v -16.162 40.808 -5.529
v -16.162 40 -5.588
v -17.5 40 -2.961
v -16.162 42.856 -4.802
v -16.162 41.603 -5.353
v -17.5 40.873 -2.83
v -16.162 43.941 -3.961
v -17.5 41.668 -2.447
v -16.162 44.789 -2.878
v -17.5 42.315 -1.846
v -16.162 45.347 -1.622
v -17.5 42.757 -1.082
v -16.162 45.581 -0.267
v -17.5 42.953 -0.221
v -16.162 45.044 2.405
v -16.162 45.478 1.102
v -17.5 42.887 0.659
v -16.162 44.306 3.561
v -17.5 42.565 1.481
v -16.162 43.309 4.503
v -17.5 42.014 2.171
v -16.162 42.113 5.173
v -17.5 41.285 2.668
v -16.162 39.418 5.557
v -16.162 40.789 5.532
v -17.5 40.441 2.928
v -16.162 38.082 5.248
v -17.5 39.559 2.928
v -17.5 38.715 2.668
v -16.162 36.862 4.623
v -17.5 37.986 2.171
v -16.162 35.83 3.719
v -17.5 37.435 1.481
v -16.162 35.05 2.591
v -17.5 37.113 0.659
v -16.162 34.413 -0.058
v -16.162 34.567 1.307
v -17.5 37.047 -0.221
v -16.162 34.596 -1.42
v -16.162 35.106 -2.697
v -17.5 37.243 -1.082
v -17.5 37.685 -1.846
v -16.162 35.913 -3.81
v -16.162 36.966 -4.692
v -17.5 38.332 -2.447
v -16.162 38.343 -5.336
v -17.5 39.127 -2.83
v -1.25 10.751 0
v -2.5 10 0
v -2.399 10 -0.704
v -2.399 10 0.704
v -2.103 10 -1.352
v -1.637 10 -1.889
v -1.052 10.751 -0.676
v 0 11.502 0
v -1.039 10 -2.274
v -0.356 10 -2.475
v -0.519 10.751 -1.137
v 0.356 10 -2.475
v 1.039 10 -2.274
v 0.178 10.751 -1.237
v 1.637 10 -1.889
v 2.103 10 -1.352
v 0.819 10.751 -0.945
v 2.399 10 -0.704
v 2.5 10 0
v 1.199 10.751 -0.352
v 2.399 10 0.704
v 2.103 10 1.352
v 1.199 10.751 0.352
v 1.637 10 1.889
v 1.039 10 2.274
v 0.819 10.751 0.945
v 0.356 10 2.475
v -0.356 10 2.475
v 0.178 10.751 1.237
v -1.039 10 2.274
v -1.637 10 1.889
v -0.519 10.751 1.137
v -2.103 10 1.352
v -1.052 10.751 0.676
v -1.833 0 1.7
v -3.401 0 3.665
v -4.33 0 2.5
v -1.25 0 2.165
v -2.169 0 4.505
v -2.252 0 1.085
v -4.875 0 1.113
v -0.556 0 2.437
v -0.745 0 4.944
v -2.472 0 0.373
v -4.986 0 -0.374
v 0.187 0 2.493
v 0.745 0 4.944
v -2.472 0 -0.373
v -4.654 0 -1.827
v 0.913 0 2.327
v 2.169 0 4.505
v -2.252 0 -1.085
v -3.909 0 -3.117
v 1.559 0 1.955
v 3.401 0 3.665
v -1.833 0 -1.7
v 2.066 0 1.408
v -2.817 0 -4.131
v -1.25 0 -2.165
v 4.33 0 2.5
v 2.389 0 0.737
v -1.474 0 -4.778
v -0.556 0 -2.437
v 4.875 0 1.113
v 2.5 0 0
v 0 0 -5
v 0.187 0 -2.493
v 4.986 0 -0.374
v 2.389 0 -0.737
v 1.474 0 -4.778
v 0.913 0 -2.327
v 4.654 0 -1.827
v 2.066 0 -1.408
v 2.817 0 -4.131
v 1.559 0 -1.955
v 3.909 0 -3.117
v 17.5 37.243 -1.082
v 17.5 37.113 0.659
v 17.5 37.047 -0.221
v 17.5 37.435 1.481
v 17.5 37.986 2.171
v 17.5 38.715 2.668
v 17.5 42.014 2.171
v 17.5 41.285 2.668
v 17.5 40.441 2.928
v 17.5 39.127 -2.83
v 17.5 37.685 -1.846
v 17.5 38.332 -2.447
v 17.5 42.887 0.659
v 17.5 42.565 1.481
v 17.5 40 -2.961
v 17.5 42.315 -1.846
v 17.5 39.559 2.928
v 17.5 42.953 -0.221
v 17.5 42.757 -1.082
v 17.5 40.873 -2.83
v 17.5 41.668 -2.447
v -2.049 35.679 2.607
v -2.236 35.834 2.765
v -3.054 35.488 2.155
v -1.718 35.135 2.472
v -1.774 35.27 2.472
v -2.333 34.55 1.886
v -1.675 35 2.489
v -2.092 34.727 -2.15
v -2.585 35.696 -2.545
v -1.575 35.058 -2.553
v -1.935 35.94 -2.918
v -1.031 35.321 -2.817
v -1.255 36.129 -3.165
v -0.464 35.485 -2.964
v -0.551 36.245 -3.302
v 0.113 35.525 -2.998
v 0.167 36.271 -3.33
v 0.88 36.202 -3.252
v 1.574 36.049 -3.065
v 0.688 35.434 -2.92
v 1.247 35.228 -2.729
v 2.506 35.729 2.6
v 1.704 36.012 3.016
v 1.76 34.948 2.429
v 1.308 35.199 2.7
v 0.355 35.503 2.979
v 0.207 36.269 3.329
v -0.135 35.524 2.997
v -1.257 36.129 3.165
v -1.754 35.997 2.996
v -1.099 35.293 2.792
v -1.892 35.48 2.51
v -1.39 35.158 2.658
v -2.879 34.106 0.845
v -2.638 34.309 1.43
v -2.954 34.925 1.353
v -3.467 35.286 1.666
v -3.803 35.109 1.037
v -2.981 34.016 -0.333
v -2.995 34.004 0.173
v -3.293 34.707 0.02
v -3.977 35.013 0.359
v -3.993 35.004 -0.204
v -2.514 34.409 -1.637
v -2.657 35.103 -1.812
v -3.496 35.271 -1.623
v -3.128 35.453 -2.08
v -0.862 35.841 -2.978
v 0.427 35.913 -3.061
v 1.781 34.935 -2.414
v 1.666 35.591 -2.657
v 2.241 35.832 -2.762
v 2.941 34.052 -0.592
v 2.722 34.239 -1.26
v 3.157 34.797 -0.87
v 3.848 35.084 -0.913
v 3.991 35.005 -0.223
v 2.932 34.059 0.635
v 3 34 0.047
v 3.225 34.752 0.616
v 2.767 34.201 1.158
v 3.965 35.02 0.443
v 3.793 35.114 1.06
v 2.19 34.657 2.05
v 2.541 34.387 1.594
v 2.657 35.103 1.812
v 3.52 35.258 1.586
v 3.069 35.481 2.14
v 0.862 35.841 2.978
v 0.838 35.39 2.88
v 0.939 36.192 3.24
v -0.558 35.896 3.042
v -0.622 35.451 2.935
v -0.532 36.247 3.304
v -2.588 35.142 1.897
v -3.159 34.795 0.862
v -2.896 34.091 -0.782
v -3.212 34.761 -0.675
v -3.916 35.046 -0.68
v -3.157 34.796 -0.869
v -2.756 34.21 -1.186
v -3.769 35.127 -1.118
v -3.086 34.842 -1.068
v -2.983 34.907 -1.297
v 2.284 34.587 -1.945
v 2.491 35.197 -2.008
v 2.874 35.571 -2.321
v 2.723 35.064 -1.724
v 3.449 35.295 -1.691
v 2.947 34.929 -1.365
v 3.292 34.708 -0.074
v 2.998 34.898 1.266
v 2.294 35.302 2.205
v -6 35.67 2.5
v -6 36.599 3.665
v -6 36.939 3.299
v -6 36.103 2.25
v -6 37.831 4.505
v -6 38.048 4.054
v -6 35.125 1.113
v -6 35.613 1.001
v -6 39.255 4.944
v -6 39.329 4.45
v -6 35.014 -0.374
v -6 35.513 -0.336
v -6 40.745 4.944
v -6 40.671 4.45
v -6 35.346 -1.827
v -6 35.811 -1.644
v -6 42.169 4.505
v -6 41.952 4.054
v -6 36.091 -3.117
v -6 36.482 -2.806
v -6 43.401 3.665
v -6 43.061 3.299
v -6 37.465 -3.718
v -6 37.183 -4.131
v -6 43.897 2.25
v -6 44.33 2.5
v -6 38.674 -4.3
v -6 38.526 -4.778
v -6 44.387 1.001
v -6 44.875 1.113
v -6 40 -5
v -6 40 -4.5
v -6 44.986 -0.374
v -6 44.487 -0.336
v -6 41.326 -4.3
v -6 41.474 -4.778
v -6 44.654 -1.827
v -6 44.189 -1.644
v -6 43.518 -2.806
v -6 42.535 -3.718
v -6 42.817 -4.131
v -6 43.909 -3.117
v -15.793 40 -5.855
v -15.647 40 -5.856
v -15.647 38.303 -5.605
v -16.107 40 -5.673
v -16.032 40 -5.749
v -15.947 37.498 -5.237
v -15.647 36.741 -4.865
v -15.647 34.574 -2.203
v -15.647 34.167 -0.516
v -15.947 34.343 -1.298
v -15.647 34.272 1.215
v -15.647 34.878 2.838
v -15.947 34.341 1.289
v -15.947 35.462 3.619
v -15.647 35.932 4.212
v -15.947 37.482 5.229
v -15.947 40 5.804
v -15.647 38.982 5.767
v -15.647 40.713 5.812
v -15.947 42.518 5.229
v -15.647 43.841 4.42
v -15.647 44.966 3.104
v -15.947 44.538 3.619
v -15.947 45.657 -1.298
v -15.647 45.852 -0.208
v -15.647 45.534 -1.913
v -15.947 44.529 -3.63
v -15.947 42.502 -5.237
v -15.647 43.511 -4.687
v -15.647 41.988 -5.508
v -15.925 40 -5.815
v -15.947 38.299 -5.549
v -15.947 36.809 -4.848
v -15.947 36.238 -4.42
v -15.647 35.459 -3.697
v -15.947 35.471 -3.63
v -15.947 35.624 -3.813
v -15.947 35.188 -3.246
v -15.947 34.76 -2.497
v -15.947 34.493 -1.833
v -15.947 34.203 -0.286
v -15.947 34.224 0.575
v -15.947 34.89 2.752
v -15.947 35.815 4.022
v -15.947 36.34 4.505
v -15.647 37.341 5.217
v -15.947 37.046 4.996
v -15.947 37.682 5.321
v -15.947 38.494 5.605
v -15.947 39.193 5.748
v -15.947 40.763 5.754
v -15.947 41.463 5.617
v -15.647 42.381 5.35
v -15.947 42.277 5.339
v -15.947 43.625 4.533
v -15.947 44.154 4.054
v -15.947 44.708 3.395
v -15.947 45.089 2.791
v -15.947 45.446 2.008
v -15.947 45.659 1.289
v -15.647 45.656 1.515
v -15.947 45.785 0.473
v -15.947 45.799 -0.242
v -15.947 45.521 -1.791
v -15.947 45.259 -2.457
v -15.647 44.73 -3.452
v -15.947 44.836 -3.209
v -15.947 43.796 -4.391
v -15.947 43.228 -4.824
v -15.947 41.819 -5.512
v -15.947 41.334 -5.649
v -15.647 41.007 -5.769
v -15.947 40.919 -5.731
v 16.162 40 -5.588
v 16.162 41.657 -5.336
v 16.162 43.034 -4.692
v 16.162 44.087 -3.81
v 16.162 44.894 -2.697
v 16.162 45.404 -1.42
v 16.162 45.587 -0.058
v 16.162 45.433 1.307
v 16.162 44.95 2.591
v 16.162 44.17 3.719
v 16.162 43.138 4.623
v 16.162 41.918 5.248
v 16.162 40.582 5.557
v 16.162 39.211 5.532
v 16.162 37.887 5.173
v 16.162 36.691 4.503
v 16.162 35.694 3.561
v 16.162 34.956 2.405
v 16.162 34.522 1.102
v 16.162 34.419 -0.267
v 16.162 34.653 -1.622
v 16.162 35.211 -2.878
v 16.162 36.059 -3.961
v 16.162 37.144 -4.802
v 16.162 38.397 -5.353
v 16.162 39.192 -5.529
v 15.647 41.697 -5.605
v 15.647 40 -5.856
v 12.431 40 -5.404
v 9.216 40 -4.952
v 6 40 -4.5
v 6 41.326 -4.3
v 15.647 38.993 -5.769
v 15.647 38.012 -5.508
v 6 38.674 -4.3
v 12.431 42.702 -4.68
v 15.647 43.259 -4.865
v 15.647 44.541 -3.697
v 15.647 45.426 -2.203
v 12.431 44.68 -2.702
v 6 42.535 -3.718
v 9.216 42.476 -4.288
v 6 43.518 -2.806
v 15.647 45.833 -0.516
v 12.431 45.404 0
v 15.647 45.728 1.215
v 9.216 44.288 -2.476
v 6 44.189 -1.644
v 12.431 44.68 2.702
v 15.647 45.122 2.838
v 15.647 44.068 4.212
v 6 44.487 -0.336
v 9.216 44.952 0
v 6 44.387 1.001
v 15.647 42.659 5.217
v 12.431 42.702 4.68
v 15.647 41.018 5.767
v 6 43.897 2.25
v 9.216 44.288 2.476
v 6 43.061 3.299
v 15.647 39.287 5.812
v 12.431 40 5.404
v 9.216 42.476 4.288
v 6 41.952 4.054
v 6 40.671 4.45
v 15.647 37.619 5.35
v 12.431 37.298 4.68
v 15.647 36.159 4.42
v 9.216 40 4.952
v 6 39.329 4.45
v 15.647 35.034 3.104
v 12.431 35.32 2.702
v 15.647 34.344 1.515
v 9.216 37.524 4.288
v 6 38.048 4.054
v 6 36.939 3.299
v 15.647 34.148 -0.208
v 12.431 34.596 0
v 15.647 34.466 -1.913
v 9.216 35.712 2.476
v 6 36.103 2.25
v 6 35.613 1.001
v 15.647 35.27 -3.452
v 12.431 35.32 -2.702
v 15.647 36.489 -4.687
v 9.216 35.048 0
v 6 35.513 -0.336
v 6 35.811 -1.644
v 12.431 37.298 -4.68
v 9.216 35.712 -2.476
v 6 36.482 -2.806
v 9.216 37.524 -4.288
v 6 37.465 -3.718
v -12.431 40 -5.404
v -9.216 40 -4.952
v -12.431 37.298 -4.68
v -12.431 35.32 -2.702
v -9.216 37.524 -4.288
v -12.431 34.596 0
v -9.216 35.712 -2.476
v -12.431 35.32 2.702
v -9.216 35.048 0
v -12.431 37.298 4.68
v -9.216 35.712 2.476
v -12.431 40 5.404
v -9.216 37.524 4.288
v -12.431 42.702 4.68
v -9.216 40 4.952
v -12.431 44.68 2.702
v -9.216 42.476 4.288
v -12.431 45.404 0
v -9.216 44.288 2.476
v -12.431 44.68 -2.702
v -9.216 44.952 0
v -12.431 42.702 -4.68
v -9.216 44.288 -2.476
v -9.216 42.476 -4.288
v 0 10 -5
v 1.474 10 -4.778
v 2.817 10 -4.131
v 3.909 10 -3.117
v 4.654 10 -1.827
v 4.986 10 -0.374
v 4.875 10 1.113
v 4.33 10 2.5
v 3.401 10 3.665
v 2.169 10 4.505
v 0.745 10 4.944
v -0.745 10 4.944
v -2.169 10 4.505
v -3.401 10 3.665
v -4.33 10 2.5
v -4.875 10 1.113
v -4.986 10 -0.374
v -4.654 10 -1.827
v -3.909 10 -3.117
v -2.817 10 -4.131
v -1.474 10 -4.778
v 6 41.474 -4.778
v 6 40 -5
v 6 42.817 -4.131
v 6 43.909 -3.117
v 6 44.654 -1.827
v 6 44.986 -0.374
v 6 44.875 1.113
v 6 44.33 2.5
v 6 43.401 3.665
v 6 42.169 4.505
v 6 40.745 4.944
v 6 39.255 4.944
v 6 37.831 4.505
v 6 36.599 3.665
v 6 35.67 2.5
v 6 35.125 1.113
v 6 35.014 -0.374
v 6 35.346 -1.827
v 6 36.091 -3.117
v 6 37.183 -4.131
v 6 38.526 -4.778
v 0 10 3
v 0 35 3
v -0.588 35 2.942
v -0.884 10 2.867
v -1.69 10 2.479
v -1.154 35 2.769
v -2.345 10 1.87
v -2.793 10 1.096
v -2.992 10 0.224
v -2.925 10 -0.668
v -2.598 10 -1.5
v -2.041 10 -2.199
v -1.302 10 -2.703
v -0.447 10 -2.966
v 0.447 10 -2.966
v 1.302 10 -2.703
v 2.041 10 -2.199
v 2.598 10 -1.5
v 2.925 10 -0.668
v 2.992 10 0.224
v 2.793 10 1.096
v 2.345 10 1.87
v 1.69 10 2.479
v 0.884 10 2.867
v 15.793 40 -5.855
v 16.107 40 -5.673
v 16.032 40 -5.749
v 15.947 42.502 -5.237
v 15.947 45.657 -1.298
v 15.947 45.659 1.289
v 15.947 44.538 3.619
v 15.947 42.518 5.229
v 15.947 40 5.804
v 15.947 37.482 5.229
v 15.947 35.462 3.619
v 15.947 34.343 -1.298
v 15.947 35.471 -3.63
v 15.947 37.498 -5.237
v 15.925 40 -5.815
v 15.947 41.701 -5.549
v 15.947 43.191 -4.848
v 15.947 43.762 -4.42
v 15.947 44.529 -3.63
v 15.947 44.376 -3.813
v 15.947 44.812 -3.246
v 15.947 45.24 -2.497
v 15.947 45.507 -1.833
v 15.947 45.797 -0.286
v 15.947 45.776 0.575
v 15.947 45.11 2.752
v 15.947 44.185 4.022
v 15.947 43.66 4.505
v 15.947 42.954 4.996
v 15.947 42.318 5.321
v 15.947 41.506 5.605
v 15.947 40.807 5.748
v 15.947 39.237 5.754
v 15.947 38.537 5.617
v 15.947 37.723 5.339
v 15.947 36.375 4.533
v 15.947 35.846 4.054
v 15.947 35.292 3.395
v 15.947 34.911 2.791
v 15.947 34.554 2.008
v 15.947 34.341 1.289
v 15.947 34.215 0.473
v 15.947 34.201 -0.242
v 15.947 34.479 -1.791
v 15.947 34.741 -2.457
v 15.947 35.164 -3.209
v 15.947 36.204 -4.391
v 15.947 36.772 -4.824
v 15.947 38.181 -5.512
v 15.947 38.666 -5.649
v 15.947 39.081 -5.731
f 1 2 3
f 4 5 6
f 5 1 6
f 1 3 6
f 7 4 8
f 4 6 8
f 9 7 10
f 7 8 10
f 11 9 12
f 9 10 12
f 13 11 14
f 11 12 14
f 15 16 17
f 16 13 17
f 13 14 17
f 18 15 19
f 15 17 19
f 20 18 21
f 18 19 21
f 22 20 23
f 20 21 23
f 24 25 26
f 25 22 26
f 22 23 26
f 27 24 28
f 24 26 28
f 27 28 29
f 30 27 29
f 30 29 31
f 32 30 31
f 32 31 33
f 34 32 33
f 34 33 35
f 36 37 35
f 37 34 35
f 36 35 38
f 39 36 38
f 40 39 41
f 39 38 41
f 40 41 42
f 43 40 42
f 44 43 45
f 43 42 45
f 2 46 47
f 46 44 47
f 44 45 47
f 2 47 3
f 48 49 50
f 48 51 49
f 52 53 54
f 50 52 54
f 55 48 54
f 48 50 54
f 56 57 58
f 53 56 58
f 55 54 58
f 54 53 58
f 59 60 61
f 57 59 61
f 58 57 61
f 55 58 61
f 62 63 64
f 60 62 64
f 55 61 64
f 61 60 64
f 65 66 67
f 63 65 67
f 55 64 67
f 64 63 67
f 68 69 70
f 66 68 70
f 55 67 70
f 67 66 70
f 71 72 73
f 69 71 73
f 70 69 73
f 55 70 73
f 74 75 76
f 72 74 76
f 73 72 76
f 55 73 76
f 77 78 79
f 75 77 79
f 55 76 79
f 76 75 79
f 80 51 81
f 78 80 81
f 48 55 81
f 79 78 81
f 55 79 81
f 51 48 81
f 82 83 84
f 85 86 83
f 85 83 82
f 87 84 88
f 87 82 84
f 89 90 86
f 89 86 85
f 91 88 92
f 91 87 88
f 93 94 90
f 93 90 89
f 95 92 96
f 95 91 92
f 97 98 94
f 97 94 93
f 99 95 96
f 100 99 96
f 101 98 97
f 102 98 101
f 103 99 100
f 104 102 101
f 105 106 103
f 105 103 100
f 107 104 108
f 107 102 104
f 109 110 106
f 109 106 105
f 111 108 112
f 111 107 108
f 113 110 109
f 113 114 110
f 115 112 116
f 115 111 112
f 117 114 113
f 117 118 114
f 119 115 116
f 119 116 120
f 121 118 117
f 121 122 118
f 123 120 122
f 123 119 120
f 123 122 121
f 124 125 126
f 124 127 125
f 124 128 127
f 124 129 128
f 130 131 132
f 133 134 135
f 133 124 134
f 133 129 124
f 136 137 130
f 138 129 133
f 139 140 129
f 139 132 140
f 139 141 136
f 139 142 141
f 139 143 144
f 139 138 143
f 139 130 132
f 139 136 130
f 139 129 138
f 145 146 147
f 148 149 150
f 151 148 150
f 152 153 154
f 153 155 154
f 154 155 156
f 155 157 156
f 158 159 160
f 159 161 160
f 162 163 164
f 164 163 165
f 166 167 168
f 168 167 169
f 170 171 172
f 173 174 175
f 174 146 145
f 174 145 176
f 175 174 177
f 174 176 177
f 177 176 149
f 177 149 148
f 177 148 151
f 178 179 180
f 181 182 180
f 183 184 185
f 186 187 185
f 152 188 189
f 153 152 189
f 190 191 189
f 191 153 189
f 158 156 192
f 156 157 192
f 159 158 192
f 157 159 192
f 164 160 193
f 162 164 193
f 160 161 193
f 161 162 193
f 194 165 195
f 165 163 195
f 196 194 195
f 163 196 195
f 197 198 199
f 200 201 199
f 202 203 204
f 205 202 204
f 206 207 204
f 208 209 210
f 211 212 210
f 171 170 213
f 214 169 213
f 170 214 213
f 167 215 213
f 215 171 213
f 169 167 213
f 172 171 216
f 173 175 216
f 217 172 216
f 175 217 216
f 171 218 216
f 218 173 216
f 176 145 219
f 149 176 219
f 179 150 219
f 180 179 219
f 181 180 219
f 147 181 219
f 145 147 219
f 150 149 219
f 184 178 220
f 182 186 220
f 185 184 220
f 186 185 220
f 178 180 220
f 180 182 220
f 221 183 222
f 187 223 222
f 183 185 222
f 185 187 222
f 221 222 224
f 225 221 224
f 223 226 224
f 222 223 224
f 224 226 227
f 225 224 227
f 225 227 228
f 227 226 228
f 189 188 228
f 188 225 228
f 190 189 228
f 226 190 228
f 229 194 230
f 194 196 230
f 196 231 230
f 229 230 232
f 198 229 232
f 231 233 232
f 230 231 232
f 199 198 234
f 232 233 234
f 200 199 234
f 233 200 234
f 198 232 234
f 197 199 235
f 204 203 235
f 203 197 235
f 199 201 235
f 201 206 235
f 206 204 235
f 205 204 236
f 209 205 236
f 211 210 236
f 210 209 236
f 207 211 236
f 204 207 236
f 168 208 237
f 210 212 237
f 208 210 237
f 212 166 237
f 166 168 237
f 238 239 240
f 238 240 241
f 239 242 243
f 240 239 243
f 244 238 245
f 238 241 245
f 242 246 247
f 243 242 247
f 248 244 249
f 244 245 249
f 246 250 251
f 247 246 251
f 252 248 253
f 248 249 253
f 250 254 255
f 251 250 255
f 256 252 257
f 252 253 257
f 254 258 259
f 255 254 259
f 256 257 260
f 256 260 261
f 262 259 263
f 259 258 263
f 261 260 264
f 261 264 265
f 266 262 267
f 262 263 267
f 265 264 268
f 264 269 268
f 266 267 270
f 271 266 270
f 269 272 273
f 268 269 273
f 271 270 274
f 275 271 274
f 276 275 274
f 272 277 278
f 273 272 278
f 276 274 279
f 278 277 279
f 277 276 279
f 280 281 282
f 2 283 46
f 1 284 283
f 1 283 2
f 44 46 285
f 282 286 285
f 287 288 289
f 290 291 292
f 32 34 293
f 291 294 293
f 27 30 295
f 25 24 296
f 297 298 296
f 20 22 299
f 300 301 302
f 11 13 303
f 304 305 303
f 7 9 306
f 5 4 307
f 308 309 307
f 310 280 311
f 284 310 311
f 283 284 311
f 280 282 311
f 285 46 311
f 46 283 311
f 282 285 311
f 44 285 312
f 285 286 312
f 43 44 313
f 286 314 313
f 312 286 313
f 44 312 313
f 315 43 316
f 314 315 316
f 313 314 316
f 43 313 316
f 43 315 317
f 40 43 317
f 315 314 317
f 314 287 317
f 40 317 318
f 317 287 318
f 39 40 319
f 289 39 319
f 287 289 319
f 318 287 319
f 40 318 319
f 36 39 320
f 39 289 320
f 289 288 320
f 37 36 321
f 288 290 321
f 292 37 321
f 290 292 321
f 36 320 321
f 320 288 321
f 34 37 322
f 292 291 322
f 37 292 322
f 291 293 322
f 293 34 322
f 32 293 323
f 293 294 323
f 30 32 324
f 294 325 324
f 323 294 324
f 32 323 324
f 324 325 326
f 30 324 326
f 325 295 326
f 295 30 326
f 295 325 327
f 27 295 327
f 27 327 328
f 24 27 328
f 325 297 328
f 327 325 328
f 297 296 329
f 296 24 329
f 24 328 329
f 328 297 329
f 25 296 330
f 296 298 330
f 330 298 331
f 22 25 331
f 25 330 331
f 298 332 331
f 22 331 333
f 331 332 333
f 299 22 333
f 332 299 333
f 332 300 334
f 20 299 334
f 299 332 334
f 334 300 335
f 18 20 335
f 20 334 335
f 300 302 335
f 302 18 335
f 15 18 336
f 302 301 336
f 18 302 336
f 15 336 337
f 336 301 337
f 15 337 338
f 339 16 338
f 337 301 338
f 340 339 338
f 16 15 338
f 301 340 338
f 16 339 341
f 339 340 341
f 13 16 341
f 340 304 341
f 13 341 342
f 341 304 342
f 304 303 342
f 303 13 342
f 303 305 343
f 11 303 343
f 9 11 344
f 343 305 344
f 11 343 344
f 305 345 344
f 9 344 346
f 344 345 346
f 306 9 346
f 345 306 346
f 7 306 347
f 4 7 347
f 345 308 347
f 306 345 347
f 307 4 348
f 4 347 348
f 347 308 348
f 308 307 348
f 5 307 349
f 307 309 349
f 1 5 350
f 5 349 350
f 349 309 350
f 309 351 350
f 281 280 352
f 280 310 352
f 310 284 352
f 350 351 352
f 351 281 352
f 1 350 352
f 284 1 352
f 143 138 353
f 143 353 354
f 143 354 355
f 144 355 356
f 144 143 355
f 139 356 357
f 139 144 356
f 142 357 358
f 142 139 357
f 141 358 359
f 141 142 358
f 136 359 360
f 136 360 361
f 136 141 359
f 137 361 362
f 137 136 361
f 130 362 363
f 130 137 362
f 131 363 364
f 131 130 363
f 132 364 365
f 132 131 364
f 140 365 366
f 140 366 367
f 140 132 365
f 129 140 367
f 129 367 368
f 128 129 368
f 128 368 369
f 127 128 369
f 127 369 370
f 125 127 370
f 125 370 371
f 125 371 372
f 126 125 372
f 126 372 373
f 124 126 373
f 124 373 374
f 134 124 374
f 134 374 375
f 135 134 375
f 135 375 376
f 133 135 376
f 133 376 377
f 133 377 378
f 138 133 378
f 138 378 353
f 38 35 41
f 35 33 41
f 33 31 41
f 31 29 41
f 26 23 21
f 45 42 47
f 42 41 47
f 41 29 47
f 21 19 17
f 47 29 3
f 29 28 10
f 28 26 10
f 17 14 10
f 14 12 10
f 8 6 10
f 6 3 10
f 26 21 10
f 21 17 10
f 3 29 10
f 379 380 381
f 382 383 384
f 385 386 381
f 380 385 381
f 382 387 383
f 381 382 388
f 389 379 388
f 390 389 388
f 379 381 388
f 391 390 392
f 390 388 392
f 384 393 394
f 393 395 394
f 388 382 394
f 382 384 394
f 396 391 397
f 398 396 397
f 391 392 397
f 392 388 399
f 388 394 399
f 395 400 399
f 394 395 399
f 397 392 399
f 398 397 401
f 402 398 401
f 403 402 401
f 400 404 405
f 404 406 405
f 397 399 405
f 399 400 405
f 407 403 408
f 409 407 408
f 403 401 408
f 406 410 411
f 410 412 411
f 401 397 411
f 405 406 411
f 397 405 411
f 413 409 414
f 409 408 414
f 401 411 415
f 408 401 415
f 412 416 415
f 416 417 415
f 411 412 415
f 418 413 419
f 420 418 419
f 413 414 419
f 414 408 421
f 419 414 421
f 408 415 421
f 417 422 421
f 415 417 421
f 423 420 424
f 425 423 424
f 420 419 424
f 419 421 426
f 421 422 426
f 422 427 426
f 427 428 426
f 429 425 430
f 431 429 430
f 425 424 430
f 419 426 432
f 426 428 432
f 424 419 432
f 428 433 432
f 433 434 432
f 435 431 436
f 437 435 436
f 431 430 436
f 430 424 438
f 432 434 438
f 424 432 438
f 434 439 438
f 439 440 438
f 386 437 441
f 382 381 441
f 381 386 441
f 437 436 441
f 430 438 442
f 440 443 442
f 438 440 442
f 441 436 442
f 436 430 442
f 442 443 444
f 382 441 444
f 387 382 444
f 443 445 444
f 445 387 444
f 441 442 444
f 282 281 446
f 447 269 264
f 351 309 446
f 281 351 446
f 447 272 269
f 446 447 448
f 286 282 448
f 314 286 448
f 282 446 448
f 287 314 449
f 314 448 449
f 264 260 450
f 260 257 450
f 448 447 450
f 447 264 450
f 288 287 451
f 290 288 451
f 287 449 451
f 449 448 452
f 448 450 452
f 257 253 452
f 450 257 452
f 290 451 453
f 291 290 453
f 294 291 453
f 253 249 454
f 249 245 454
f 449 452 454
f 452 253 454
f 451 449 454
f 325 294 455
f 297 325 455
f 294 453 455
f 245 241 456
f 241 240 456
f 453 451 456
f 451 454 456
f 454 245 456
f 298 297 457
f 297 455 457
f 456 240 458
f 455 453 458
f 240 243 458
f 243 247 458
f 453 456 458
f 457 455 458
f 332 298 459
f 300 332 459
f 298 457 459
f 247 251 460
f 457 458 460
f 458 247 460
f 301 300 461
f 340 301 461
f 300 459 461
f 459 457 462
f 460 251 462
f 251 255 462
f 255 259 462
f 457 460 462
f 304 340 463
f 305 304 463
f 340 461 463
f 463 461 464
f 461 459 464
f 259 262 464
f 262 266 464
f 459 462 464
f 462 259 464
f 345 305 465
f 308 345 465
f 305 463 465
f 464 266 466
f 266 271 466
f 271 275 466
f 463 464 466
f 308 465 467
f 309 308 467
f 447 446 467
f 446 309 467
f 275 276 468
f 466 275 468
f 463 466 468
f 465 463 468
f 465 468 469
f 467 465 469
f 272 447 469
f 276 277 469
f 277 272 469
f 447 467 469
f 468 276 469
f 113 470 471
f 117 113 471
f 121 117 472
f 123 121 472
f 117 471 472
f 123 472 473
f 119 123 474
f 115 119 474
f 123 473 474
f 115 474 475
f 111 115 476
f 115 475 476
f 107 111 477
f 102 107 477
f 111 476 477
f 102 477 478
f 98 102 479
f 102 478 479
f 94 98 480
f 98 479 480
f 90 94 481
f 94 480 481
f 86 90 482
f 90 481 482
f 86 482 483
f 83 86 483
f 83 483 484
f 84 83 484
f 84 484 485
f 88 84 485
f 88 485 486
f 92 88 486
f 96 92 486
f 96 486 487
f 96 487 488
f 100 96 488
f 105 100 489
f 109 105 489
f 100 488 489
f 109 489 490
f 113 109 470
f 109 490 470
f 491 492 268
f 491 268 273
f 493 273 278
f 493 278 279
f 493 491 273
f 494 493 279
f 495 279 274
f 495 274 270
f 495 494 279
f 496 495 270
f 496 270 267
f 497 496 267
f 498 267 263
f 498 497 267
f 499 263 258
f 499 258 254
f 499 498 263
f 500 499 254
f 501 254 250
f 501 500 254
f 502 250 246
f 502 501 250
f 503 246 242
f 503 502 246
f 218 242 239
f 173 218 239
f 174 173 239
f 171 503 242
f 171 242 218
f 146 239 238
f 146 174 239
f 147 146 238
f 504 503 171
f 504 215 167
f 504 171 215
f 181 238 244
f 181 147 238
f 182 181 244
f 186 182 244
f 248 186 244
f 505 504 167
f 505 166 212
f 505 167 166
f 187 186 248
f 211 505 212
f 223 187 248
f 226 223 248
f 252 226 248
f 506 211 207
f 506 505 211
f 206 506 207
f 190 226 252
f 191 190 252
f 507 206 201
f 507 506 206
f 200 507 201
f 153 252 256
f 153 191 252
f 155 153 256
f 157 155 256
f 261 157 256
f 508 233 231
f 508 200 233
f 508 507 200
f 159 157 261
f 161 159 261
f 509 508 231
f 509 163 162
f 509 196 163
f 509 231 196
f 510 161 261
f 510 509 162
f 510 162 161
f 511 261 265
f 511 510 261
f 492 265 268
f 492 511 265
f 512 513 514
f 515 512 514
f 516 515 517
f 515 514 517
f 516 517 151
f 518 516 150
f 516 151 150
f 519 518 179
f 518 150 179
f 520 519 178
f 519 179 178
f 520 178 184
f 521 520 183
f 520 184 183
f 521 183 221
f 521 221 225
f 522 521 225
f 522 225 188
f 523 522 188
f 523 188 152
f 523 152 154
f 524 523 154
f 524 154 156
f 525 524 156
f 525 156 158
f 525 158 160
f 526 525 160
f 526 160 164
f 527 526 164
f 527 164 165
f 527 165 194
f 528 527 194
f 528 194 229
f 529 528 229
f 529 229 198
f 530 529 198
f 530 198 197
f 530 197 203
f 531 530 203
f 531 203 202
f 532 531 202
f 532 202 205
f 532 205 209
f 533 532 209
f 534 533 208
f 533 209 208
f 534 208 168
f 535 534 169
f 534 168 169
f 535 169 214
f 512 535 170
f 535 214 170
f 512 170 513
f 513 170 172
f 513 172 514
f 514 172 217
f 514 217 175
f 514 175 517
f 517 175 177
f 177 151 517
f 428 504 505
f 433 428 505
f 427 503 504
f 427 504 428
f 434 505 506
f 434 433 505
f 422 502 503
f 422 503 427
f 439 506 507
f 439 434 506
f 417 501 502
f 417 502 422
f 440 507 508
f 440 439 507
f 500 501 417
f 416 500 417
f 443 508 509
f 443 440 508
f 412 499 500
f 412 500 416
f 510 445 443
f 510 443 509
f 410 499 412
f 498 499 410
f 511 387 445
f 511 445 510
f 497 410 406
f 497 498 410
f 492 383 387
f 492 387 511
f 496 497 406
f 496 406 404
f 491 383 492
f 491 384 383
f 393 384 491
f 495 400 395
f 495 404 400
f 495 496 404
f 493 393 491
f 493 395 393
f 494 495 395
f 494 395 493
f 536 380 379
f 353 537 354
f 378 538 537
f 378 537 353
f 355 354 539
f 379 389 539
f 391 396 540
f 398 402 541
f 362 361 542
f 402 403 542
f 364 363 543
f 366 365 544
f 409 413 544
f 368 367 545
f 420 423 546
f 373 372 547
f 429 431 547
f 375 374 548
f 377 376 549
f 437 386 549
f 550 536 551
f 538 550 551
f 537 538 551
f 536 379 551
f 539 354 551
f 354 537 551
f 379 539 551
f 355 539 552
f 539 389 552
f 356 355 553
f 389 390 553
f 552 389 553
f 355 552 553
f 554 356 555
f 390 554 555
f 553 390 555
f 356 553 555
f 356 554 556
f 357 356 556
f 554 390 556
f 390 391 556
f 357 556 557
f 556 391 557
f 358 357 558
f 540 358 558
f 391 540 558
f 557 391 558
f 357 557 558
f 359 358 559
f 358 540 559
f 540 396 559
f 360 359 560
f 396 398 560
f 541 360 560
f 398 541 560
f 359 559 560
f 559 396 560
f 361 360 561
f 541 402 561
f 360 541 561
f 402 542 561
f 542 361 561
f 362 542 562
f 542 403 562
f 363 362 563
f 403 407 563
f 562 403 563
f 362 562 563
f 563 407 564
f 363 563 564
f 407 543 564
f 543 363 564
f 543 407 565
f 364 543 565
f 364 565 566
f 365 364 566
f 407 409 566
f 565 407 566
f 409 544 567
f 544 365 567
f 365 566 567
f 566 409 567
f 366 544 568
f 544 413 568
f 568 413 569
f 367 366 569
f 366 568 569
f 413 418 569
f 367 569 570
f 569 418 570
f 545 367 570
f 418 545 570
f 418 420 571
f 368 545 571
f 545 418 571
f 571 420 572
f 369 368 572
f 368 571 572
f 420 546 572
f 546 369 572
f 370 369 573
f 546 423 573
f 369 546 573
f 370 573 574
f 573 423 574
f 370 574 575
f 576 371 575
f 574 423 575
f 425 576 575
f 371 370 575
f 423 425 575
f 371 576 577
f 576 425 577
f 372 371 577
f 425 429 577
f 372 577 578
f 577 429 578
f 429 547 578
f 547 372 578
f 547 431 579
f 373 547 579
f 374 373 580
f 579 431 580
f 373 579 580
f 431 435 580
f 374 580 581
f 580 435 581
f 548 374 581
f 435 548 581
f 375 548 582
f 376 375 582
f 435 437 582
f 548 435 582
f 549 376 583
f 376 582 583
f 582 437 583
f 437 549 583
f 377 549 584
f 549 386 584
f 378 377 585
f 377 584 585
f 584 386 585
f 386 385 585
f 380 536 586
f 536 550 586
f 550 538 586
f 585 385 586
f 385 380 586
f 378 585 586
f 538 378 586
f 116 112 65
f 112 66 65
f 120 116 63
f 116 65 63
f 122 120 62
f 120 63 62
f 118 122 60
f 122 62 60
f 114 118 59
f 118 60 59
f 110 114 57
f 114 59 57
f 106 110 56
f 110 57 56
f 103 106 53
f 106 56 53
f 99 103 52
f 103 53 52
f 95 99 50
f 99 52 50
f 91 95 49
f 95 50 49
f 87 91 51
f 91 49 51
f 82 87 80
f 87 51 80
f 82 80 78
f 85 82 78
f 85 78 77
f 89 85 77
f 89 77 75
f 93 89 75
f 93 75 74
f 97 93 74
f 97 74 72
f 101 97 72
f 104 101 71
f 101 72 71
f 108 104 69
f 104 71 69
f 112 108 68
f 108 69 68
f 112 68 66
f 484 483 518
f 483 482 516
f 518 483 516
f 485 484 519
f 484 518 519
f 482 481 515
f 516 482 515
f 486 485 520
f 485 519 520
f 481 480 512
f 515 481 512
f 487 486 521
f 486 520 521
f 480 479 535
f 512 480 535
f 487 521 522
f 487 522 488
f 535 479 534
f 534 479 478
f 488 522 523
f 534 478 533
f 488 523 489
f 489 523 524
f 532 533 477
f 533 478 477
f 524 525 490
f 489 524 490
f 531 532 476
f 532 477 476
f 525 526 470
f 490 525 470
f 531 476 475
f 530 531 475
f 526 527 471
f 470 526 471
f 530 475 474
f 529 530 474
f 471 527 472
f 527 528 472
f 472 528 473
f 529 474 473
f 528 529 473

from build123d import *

# Parameters (mm, degrees)
SKETCH3_R                            = 5
BOSS_EXTRUDE1_DEPTH                  = 6
SKETCH4_R                            = 4.5
BOSS_EXTRUDE2_DEPTH                  = 10
BOSS_EXTRUDE2_DRAFT                  = -8
MIRROR1_COPY_1_SKETCH_R              = 4.5
MIRROR1_COPY_1_DEPTH                 = 10
MIRROR1_COPY_1_DRAFT                 = -8
SKETCH5_R                            = 3
BOSS_EXTRUDE3_DEPTH                  = 25
BOSS_EXTRUDE3_DIRECTION_2_REACH      = 22.244
BOSS_EXTRUDE3_DIRECTION_2_END_RADIUS = 5
SKETCH6_R                            = 5
BOSS_EXTRUDE4_DEPTH                  = 10
F_5_0MM_DOWEL_HOLE1_D                = 5
F_5_0MM_DOWEL_HOLE1_DEPTH            = 10
F_5_0MM_DOWEL_HOLE1_TIP              = 1.502151548
SKETCH9_R                            = 5.905408347
BOSS_EXTRUDE5_DEPTH                  = 1.5
BOSS_EXTRUDE5_TAPER                  = 63
FILLET1_R                            = 1
FILLET2_R                            = 0.5


with BuildPart() as part:
    # Sketch3 → Boss-Extrude1 (new, symmetric)
    with BuildSketch(Plane(origin=(0, 0, 0), x_dir=(0, 0, -1), z_dir=(1, 0, 0))):
        with Locations((0, 40)):
            Circle(SKETCH3_R)
    extrude(amount=BOSS_EXTRUDE1_DEPTH, both=True)


with BuildPart() as boss_extrude2_tool:
    # Sketch4 → Boss-Extrude2 (with draft: the straight prism first)
    with BuildSketch(Plane(origin=(6, 0, 0), x_dir=(0, 0, -1), z_dir=(1, 0, 0))):
        with Locations((0, 40)):
            Circle(SKETCH4_R)
    extrude(amount=BOSS_EXTRUDE2_DEPTH)
    # Boss-Extrude2: the draft: its side faces are tilted about the plane it starts from
    boss_extrude2_sides = [boss_extrude2_tool.faces().sort_by_distance(p)[0] for p in [
        (11, 40, 4.5),
    ]]
    draft(boss_extrude2_sides, Plane(origin=(6, 0, 0), x_dir=(0, 0, -1), z_dir=(1, 0, 0)), BOSS_EXTRUDE2_DRAFT)


with BuildPart() as part_1:
    add(part.part)

    # Boss-Extrude2: add boss_extrude2_tool
    add(boss_extrude2_tool.part)


with BuildPart() as mirror1_copy_1_tool:
    # Mirror1 copy 1 sketch → Mirror1 copy 1 (with draft: the straight prism first)
    with BuildSketch(Plane(origin=(-6, 0, 0), x_dir=(0, 0, -1), z_dir=(-1, 0, 0))):
        with Locations((0, -40)):
            Circle(MIRROR1_COPY_1_SKETCH_R)
    extrude(amount=MIRROR1_COPY_1_DEPTH)
    # Mirror1 copy 1: the draft: its side faces are tilted about the plane it starts from
    mirror1_copy_1_sides = [mirror1_copy_1_tool.faces().sort_by_distance(p)[0] for p in [
        (-11, 40, 4.5),
    ]]
    draft(mirror1_copy_1_sides, Plane(origin=(-6, 0, 0), x_dir=(0, 0, -1), z_dir=(-1, 0, 0)), MIRROR1_COPY_1_DRAFT)


with BuildPart() as part_2:
    add(part_1.part)

    # Mirror1 copy 1: add mirror1_copy_1_tool
    add(mirror1_copy_1_tool.part)

    # Sketch5 → Boss-Extrude3 (add)
    with BuildSketch(Plane(origin=(0, 35, 0), x_dir=(-1, 0, 0), z_dir=(0, -1, 0))):
        with Locations(Location((0, 0, 0), (0, 0, 270))):
            Circle(SKETCH5_R)
    extrude(amount=BOSS_EXTRUDE3_DEPTH)

    # Boss-Extrude3 direction 2: up to this cylinder (the profile starts outside it)
    boss_extrude3_direction_2_end = Plane(origin=(0, 40, 0), z_dir=(-1, 0, 0)) * Cylinder(BOSS_EXTRUDE3_DIRECTION_2_END_RADIUS, 55.488, mode=Mode.PRIVATE)
    # Sketch5 → Boss-Extrude3 direction 2 (add, up to the surface)
    with BuildSketch(Plane(origin=(0, 35, 0), x_dir=(-1, 0, 0), z_dir=(0, -1, 0)), mode=Mode.PRIVATE) as boss_extrude3_direction_2_sk1:
        with Locations(Location((0, 0, 0), (0, 0, 270))):
            Circle(SKETCH5_R)
    boss_extrude3_direction_2_tool1 = extrude(boss_extrude3_direction_2_sk1.sketch, amount=-BOSS_EXTRUDE3_DIRECTION_2_REACH, mode=Mode.PRIVATE) - boss_extrude3_direction_2_end
    add(boss_extrude3_direction_2_tool1.solids().sort_by_distance((0, 35, 0))[0])
    add(boss_extrude3_direction_2_tool1.solids().sort_by_distance((0, 35, 0))[1])

    # Sketch6 → Boss-Extrude4 (add)
    with BuildSketch(Plane.XZ.offset(-10)):
        with Locations(Location((0, 0, 0), (0, 0, 270))):
            Circle(SKETCH6_R)
    extrude(amount=BOSS_EXTRUDE4_DEPTH)

    # Ø5.0mm Dowel Hole1
    with Locations(Plane(origin=(0, 0, 0), x_dir=(-1, 0, 0), z_dir=(0, -1, 0))):
        with Locations((0, 0)):
            Hole(F_5_0MM_DOWEL_HOLE1_D / 2, depth=F_5_0MM_DOWEL_HOLE1_DEPTH)
            with Locations((0, 0, -(F_5_0MM_DOWEL_HOLE1_DEPTH + F_5_0MM_DOWEL_HOLE1_TIP / 2))):  # 118° drill point
                Cone(0, F_5_0MM_DOWEL_HOLE1_D / 2, F_5_0MM_DOWEL_HOLE1_TIP, mode=Mode.SUBTRACT)

    # Sketch9 → Boss-Extrude5 (add)
    with BuildSketch(Plane(origin=(16, 0, 0), x_dir=(0, 0, -1), z_dir=(1, 0, 0))):
        with Locations((0, 40)):
            Circle(SKETCH9_R)
    boss_extrude5 = extrude(amount=BOSS_EXTRUDE5_DEPTH, taper=BOSS_EXTRUDE5_TAPER)

    # Mirror2: Boss-Extrude5 across plane
    add(boss_extrude5.mirror(Plane(origin=(0, 0, 0), x_dir=(0, 0, 1), z_dir=(1, 0, 0))))

    # Fillet1
    fillet1_edges = [part_2.edges().sort_by_distance(p)[0] for p in [
        (3.000000007, 34.999999994, -1e-09),
    ]]
    fillet(fillet1_edges, radius=FILLET1_R)

    # Fillet2
    fillet2_edges = [part_2.edges().sort_by_distance(p)[0] for p in [
        (-16, 40, 5.905408347),
        (16, 40, 5.905408347),
    ]]
    fillet(fillet2_edges, radius=FILLET2_R)


solid = part_2.part
